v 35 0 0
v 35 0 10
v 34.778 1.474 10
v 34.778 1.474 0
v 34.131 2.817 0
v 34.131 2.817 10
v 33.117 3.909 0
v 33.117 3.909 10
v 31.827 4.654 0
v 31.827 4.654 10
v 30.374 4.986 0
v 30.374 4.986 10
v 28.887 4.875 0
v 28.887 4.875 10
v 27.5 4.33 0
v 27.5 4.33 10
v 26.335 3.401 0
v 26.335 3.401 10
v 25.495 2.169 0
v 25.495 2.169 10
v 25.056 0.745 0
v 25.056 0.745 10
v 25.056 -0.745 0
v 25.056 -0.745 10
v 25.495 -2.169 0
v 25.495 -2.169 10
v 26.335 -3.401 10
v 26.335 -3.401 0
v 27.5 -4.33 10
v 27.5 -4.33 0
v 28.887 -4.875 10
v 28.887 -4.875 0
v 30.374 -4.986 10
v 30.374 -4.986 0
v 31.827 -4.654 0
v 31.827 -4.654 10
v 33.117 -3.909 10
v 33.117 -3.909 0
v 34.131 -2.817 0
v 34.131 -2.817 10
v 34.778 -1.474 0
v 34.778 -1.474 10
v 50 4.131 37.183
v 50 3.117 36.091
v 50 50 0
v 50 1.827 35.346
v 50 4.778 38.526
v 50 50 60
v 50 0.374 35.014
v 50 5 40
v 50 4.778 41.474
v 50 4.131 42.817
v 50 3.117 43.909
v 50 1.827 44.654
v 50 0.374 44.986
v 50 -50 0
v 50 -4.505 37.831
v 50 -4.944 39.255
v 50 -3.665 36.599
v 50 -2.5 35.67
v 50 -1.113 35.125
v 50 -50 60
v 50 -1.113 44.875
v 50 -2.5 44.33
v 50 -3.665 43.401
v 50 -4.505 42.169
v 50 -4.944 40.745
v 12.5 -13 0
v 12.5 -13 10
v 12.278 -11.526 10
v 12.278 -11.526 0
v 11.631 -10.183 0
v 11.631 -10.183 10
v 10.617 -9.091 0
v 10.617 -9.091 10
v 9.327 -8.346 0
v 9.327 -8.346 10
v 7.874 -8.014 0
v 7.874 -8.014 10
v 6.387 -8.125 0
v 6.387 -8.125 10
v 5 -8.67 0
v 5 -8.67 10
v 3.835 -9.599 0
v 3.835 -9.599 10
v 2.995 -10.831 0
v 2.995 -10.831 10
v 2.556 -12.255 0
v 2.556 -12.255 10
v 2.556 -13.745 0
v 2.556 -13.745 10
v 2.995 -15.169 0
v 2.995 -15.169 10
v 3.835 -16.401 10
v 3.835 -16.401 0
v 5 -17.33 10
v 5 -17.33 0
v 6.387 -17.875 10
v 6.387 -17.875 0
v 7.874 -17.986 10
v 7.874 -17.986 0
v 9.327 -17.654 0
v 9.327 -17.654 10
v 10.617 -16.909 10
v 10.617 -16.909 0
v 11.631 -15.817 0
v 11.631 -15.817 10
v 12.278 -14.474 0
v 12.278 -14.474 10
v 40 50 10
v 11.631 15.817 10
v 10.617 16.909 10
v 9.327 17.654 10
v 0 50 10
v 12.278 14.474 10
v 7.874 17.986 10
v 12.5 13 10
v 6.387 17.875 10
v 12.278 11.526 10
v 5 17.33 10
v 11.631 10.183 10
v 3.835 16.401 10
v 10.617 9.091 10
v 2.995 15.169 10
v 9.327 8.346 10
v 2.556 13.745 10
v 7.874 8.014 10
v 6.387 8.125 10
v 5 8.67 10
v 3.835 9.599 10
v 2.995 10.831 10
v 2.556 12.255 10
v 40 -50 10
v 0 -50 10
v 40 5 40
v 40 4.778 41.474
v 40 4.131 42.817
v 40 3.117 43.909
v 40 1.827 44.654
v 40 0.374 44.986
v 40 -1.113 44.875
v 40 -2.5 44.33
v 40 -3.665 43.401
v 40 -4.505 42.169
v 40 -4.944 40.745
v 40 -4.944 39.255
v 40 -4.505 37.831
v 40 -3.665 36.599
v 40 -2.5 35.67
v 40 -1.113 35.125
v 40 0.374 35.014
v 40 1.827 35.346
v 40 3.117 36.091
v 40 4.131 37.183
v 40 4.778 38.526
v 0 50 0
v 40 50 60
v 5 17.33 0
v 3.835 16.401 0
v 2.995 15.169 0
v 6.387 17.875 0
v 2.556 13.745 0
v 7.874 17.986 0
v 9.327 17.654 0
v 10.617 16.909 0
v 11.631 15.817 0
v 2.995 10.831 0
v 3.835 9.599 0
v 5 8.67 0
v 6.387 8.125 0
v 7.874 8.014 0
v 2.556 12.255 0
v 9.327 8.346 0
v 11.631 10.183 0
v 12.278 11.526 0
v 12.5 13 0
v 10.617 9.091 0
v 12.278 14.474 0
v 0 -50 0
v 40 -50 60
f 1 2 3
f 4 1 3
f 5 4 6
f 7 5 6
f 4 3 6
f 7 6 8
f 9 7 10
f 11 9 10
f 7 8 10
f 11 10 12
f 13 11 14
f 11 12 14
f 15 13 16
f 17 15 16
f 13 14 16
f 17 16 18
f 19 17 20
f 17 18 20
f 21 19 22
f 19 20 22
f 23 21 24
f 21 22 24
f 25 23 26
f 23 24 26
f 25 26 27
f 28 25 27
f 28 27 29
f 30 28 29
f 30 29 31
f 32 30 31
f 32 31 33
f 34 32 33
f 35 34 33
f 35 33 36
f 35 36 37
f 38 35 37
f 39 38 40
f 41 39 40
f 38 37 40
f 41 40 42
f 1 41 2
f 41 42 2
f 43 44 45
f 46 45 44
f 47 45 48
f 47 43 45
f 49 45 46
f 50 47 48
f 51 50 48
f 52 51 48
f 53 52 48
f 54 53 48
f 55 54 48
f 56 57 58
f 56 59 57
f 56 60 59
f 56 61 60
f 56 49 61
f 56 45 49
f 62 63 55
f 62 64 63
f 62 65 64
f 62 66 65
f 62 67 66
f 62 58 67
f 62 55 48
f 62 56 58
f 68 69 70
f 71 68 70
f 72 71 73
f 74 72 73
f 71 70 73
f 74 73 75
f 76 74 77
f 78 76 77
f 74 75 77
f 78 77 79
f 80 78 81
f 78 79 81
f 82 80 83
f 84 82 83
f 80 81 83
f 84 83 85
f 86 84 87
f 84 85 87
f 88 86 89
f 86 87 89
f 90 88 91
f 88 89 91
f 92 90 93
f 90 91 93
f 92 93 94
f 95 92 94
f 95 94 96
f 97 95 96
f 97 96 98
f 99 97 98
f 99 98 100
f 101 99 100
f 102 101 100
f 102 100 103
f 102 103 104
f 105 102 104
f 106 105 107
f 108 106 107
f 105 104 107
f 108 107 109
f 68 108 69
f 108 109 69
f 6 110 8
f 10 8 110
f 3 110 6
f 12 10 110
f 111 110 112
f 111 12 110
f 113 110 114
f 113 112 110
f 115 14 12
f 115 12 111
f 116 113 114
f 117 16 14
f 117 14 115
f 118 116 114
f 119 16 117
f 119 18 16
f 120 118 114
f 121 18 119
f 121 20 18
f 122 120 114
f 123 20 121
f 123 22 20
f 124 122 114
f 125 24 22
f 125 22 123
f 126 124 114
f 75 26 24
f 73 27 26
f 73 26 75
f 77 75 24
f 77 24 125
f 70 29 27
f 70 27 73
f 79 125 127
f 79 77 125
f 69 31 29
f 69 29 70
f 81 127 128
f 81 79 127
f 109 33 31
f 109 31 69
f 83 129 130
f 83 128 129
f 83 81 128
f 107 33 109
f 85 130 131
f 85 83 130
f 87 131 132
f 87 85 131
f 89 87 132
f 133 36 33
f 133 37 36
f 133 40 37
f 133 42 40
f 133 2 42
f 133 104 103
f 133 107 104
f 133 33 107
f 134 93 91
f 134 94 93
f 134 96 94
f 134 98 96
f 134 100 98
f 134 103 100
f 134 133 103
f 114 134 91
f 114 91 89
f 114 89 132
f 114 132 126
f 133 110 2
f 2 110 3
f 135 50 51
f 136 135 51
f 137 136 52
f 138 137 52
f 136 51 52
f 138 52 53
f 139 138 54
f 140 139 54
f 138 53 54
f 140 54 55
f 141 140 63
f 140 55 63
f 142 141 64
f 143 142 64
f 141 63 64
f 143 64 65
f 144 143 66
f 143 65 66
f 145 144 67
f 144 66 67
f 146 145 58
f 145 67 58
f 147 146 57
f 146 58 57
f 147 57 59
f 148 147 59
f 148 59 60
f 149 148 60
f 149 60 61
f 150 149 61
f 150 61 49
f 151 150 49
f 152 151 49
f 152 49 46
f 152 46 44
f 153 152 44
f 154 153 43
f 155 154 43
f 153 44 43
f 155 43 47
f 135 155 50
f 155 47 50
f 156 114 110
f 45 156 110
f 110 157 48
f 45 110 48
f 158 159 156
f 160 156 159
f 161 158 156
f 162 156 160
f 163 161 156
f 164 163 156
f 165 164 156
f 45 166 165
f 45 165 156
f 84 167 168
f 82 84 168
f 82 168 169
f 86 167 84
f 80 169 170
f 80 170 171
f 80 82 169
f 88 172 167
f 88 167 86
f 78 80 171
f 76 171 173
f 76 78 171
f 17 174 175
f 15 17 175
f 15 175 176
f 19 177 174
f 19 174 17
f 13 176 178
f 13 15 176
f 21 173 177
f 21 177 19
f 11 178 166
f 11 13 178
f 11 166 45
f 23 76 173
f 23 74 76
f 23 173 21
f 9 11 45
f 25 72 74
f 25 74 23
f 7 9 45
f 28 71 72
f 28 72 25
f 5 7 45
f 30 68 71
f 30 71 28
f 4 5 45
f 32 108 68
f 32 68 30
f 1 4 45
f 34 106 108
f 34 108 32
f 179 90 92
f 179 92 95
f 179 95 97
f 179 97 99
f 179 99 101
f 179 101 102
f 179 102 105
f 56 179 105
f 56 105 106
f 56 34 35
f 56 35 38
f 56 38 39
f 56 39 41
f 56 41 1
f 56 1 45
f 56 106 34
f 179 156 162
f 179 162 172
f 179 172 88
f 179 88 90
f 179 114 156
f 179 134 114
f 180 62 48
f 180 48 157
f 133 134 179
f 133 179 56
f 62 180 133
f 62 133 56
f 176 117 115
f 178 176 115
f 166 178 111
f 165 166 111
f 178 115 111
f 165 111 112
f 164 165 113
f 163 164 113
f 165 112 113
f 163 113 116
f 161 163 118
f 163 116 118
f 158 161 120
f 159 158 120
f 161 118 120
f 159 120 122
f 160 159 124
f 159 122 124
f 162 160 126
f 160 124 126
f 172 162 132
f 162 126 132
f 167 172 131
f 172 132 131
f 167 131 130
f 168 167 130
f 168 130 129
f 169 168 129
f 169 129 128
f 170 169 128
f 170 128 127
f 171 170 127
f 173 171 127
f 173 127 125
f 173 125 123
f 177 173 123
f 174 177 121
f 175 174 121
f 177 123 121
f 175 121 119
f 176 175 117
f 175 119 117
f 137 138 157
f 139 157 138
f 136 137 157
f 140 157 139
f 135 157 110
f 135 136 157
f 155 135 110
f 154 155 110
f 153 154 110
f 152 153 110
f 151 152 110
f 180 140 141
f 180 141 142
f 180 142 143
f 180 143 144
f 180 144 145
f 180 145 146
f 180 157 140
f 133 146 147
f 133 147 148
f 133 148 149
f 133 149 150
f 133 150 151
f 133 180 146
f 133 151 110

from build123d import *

# Parameters (mm, degrees)
F1_DEPTH = 50
F2_R     = 5
F3_DEPTH = 10
F4_R     = 5
F5_DEPTH = 10


with BuildPart() as f1:
    # F0 (on Front) → F1 (new body, symmetric)
    with BuildSketch(Plane.XZ):
        Polygon((0, 10), (0, 0), (50, 0), (50, 60), (40, 60), (40, 10), align=None)
    extrude(amount=F1_DEPTH, both=True)

    # F2 (on face) → F3 (cut, through all)
    with BuildSketch(Plane.YZ.offset(50)):
        with Locations((0, 40)):
            Circle(F2_R)
    extrude(amount=-F3_DEPTH, mode=Mode.SUBTRACT)

    # F4 (on face) → F5 (cut, through all)
    with BuildSketch(Plane.XY.offset(10)):
        with Locations((30, 0)):
            Circle(F4_R)
        with Locations((7.5, 13)):
            Circle(F4_R)
        with Locations((7.5, -13)):
            Circle(F4_R)
    extrude(amount=-F5_DEPTH, mode=Mode.SUBTRACT)


solid = f1.part
